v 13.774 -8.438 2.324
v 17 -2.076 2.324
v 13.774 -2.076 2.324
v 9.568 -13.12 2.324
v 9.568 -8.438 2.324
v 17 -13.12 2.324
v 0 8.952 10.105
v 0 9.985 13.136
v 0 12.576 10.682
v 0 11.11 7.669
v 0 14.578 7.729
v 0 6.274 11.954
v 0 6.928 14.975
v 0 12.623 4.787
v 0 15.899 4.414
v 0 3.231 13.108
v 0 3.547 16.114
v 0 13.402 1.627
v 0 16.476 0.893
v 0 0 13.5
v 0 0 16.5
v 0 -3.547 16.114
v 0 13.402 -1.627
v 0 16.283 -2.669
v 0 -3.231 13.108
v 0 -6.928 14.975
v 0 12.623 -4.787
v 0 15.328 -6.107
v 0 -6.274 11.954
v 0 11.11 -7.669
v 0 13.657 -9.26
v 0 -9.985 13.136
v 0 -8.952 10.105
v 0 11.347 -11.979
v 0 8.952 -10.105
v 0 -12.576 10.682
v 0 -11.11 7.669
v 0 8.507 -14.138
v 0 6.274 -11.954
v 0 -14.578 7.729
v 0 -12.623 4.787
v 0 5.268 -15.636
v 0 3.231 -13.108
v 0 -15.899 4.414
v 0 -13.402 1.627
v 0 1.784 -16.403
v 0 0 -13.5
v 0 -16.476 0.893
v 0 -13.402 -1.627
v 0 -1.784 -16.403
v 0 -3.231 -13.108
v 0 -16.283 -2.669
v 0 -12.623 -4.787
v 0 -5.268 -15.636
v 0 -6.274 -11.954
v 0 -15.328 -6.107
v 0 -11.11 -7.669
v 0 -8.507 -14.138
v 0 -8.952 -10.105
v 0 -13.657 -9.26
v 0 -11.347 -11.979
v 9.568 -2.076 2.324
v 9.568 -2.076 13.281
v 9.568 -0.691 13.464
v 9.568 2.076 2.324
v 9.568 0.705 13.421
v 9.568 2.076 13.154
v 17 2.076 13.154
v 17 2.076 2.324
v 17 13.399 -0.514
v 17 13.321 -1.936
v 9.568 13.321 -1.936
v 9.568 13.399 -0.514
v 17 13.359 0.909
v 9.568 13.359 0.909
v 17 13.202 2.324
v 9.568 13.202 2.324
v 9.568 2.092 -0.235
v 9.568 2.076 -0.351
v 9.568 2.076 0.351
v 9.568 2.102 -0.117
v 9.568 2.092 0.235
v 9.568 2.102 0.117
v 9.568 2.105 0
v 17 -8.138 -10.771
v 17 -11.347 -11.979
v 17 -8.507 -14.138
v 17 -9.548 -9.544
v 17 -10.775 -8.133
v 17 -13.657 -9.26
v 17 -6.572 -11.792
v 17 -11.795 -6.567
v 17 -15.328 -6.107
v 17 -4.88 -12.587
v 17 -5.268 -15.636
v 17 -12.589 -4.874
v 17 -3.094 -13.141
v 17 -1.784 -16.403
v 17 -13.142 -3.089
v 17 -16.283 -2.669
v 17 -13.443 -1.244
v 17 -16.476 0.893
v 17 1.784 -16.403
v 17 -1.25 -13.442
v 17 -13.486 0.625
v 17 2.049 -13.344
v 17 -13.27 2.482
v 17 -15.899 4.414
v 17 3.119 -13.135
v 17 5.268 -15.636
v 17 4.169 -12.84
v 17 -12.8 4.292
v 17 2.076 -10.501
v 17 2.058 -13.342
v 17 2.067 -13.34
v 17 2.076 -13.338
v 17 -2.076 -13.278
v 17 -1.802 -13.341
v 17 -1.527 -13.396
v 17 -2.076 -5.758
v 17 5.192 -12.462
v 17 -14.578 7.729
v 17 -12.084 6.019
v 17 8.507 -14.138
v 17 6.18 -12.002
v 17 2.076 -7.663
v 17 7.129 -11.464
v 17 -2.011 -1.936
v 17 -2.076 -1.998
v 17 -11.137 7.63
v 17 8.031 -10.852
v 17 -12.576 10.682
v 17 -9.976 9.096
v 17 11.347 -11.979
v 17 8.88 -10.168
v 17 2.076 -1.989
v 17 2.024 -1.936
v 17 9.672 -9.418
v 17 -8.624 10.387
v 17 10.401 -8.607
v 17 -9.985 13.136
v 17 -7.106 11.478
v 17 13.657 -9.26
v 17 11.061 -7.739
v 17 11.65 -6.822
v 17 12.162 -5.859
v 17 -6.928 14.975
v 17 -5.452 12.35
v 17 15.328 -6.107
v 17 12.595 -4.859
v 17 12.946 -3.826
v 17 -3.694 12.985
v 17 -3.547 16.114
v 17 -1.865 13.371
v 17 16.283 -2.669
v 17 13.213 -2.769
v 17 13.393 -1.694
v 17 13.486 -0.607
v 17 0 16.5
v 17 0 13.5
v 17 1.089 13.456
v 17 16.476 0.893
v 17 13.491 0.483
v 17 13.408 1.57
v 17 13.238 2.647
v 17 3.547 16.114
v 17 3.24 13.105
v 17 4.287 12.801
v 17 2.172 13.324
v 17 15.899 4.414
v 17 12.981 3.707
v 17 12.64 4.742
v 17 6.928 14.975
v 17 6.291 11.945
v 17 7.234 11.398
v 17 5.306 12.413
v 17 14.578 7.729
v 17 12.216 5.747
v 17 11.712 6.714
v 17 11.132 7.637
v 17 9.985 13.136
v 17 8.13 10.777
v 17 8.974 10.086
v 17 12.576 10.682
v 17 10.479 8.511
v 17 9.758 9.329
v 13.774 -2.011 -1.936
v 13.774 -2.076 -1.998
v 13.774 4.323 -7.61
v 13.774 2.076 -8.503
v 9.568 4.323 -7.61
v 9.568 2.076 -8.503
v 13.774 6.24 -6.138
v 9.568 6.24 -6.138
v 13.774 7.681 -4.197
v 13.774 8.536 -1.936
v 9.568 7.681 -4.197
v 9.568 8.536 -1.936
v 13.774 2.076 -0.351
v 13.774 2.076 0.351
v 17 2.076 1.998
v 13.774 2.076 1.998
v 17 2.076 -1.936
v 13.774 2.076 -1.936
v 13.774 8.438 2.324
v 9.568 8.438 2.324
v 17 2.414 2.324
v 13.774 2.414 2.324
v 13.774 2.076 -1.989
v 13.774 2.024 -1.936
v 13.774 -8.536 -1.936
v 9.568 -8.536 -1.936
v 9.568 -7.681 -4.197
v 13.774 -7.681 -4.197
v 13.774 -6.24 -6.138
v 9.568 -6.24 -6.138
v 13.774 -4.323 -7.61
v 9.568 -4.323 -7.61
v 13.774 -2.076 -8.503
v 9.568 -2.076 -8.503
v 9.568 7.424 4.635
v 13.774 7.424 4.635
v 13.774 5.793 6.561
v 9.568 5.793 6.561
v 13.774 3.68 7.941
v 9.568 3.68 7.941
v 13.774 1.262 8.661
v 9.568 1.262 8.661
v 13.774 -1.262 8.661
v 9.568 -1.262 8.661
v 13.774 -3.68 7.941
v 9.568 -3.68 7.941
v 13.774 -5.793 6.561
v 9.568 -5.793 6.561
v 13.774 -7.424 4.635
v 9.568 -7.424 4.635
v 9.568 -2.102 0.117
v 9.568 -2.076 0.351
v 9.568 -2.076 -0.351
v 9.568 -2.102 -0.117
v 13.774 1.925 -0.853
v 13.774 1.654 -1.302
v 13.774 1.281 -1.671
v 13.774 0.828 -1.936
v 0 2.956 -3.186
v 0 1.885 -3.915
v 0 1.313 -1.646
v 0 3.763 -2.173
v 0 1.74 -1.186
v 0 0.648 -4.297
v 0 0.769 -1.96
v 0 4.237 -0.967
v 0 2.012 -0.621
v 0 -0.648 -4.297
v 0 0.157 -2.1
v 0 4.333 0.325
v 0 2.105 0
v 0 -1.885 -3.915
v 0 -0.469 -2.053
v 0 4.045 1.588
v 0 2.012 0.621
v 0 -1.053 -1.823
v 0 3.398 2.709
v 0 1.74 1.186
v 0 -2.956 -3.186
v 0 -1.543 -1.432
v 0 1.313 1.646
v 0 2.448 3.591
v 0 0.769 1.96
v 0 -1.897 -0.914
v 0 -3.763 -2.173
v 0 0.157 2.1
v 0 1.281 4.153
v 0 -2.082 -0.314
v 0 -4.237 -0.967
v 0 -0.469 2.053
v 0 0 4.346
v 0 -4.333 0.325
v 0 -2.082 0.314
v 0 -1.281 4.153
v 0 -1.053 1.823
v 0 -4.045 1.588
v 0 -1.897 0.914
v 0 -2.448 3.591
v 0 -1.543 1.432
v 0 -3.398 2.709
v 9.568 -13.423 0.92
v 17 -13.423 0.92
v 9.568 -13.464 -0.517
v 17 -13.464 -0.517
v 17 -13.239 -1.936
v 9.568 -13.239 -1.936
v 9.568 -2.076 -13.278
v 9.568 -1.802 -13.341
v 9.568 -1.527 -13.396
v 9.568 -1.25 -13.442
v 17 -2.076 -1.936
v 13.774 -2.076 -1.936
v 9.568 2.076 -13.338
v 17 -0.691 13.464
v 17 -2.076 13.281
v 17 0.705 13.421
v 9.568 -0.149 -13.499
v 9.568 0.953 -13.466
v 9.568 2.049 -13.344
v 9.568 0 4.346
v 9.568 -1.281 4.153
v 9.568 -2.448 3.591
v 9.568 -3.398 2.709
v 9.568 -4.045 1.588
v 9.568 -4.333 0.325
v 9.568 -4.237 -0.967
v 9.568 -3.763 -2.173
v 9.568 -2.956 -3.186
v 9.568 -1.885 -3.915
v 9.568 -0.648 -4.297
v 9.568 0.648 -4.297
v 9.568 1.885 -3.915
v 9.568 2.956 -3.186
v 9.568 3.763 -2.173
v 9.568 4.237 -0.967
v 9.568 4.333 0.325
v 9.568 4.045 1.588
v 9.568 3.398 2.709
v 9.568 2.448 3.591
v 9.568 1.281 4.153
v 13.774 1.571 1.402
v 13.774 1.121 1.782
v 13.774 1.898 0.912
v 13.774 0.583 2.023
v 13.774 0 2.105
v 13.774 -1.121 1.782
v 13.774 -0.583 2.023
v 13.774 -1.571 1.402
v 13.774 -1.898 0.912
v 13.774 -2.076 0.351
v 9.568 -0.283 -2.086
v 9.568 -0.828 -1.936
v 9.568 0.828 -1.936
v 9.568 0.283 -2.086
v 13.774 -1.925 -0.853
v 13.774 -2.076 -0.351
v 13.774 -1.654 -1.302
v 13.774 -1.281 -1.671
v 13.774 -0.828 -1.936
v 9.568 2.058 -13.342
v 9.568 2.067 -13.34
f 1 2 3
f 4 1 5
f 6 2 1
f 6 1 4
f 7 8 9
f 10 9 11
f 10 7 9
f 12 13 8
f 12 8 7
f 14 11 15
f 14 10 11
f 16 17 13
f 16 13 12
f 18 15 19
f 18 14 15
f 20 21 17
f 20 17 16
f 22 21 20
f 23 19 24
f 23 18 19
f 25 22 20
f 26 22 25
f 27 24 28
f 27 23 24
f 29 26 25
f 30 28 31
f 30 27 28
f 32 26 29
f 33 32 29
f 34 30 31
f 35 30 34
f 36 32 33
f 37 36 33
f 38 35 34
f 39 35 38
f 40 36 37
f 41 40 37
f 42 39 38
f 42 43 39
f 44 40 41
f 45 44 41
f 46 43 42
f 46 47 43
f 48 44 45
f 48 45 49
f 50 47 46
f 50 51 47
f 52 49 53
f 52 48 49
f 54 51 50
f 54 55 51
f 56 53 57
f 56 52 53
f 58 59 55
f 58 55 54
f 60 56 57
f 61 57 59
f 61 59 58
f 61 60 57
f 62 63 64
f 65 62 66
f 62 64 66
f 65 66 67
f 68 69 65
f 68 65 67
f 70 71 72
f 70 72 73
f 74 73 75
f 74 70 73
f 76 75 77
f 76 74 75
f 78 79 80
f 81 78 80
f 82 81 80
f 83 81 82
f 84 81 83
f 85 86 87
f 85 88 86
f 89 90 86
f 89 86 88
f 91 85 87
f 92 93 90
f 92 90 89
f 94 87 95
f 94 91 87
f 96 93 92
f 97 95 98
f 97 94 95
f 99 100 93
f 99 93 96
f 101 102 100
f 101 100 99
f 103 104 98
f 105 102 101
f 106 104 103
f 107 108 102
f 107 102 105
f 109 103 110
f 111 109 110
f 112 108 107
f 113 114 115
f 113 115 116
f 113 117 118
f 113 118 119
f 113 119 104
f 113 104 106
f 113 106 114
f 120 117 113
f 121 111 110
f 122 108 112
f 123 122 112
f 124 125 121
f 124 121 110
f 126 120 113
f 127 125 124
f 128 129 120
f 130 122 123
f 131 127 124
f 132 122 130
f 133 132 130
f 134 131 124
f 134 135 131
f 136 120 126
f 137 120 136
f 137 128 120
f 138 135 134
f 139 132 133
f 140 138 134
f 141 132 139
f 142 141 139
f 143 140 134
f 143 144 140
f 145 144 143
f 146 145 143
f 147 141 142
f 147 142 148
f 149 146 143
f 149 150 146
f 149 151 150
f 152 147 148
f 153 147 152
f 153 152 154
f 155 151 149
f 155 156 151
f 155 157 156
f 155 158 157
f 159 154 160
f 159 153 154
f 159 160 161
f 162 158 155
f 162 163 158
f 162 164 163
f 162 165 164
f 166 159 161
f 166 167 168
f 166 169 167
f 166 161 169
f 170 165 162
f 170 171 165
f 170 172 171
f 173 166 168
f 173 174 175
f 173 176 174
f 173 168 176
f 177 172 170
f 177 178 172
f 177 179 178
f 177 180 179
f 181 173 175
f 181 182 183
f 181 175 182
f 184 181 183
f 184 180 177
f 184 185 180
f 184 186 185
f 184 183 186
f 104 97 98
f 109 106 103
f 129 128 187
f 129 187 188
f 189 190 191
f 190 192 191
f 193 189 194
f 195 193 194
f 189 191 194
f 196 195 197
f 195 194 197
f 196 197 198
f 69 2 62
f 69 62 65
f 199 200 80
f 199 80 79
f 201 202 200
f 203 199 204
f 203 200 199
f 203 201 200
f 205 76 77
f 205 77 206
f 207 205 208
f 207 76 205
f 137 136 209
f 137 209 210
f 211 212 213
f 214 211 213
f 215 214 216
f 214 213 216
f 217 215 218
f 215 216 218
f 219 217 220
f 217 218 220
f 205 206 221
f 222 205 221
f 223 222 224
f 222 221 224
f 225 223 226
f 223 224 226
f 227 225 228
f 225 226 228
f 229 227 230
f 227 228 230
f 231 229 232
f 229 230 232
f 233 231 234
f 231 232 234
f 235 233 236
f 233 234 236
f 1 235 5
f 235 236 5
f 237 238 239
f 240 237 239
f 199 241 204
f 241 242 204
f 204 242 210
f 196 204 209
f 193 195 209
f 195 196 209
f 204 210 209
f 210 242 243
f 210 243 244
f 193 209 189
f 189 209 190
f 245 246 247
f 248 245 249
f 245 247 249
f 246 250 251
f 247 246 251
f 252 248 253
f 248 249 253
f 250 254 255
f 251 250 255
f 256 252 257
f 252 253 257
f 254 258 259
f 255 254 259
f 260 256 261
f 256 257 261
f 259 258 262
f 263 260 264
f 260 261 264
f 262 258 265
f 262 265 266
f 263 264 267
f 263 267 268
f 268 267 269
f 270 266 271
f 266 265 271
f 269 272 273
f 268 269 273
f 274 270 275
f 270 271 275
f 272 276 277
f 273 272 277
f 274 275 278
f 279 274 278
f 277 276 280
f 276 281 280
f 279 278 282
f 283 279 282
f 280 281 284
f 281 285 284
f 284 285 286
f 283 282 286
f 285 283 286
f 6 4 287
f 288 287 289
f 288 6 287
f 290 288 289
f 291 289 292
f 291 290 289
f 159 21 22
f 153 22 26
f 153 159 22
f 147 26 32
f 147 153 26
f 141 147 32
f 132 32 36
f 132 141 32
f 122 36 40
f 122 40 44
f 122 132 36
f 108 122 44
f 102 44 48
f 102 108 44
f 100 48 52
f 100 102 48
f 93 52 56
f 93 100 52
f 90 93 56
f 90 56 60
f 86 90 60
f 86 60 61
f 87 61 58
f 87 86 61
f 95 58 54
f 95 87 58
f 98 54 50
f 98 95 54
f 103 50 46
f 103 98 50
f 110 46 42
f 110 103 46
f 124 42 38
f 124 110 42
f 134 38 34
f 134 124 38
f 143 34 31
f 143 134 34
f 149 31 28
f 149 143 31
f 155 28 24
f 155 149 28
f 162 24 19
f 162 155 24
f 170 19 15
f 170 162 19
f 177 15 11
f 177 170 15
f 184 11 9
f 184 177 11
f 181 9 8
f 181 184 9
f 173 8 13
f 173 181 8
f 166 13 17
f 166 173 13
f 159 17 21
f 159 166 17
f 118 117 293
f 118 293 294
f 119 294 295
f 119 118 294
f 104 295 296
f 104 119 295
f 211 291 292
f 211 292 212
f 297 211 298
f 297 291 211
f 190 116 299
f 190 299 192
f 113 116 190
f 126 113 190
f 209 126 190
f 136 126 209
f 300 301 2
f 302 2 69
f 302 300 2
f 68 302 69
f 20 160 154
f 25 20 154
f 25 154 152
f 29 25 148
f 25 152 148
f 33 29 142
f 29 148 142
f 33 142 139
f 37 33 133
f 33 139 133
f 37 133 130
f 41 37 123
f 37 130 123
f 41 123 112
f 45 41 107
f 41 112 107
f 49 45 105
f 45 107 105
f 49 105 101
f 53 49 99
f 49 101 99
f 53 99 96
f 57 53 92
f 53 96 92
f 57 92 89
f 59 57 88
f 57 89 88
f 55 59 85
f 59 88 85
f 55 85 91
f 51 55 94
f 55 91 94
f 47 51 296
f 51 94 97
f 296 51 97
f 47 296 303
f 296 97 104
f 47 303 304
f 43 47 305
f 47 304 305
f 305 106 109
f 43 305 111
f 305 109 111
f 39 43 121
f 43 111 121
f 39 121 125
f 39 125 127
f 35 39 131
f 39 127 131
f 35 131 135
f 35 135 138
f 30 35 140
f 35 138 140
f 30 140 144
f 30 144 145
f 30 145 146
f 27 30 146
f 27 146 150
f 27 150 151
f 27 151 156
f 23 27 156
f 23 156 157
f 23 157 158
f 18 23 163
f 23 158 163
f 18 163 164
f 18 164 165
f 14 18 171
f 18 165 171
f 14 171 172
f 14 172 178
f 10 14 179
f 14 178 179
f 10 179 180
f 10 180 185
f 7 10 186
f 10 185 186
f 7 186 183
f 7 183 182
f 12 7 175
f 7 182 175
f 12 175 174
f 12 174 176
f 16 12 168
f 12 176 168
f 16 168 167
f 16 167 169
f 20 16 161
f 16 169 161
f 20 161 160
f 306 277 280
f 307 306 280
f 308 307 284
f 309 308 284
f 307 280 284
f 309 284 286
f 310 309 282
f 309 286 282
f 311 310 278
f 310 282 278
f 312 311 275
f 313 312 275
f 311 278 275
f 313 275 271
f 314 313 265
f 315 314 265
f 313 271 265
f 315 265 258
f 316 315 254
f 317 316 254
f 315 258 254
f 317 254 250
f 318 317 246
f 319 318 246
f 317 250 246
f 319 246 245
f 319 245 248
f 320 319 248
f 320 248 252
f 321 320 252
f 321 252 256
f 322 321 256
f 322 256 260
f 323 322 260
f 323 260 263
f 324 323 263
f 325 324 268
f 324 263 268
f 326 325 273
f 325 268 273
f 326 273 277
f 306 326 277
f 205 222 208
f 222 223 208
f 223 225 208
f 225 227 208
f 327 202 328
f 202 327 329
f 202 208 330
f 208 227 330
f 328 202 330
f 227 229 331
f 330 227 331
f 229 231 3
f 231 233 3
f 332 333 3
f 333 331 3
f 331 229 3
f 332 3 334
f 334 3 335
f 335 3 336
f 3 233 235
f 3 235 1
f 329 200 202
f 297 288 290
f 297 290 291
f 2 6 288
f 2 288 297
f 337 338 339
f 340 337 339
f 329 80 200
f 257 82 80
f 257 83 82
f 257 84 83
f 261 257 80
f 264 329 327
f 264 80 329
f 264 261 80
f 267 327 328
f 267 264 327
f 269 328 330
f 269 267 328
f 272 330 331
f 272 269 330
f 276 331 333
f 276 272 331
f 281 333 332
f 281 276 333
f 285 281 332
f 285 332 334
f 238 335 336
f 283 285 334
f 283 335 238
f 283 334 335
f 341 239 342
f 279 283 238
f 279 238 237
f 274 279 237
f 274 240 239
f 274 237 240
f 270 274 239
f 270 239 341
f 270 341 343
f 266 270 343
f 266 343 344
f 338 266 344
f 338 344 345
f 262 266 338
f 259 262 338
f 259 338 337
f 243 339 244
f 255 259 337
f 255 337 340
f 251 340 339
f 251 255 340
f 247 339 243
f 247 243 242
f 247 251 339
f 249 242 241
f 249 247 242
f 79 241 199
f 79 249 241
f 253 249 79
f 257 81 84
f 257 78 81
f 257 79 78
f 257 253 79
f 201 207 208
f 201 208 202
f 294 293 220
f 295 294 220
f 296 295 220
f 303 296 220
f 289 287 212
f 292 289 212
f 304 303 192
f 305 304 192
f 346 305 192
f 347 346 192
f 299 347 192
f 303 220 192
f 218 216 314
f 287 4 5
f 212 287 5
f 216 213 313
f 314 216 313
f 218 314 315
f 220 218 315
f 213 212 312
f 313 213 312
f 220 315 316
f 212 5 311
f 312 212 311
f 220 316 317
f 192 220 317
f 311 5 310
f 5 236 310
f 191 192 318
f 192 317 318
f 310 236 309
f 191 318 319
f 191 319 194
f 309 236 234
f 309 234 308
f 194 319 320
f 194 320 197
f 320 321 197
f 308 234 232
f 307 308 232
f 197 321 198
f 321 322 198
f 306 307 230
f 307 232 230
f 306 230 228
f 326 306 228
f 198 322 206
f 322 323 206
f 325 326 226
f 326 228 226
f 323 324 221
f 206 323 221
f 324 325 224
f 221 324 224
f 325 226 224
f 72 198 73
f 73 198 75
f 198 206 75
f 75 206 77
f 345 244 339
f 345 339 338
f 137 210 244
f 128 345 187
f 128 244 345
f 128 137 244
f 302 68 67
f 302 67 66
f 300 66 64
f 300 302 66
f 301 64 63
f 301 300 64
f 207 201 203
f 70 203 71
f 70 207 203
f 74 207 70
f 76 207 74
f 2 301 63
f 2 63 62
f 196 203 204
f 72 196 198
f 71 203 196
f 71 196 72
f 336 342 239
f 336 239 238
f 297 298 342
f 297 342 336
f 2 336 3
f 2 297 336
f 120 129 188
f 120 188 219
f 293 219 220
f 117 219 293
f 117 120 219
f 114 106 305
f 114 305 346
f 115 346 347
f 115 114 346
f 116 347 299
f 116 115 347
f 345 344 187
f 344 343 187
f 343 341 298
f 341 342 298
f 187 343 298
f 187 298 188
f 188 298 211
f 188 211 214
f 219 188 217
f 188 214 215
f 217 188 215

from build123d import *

# Parameters (mm, degrees)
F0_W     = 17
F0_H     = 3
F2_R     = 2.10545285
F3_DEPTH = 17.001
F5_DEPTH = 7.4320044443


# Not quite as in the source:
# - a feature of the source that left no trace in its solid (it failed there, or was rolled back) is left out


with BuildPart() as f1:
    # F0 (on Front) → F1 (revolve)
    with BuildSketch(Plane.XZ):
        Polygon((0, 4.3456270359), (0, 0), (13.7743903324, 0), (13.7743903324, 8.752326481), (9.5679955557, 8.752326481), (9.5679955557, 4.3456270359), align=None)
    revolve(axis=Axis((-17.2238798179, 0, 0), (1, 0, 0)))

    # F2 (on Right) → F3 (cut, through all)
    with BuildSketch(Plane.YZ):
        Circle(F2_R)
    extrude(amount=F3_DEPTH, mode=Mode.SUBTRACT)



with BuildPart() as f1b:
    # F0 (on Front) → F1, piece 2 (revolve)
    with BuildSketch(Plane.XZ):
        with Locations((8.5, 15)):
            Rectangle(F0_W, F0_H)
    revolve(axis=Axis((-17.2238798179, 0, 0), (1, 0, 0)))


with BuildPart() as f5:
    # F4 (on face) → F5 (new body, through all)
    with BuildSketch(Plane.YZ.offset(17)):
        with BuildLine():
            Line((2.075988996, 2.3240637966), (2.075988996, 3.8176883089))
            Line((2.075988996, 3.8176883089), (2.075988996, 13.1538297552))
            ThreePointArc((2.075988996, 13.1538297552), (0.0077885172, 13.4710626416), (-2.075988996, 13.2814282551))
            Line((-2.075988996, 13.2814282551), (-2.075988996, 3.8176883089))
            Line((-2.075988996, 3.8176883089), (-2.075988996, 2.3240637966))
            Line((-2.075988996, 2.3240637966), (2.075988996, 2.3240637966))
        make_face()
    extrude(amount=-F5_DEPTH)


with BuildPart() as f1_1:
    add(f1.part)

    add(f1b.part)  # F5#2 merges F1b
    # F4 (on face) → F5, piece 2 (join, through all)
    with BuildSketch(Plane.YZ.offset(17)):
        with BuildLine():
            Line((-2.075988996, -1.9356221886), (-2.075988996, 2.3240637966))
            Line((-2.075988996, 2.3240637966), (-13.1198950112, 2.3240637966))
            ThreePointArc((-13.1198950112, 2.3240637966), (-13.4767107858, 0.2025324211), (-13.2389972203, -1.9356221886))
            Line((-13.2389972203, -1.9356221886), (-3.8907378578, -1.9356221886))
            Line((-3.8907378578, -1.9356221886), (-2.075988996, -1.9356221886))
        make_face()
        with BuildLine():
            Line((2.41431853, 2.3240637966), (2.075988996, 1.9983820725))
            Line((2.075988996, 1.9983820725), (2.075988996, -1.9356221886))
            Line((2.075988996, -1.9356221886), (13.3207021949, -1.9356221886))
            ThreePointArc((13.3207021949, -1.9356221886), (13.3933684368, 0.1979176461), (13.2015999407, 2.3240637966))
            Line((13.2015999407, 2.3240637966), (2.41431853, 2.3240637966))
        make_face()
        with BuildLine():
            Line((2.075988996, -13.3378216997), (2.075988996, -1.9891557531))
            Line((2.075988996, -1.9891557531), (2.0244566825, -1.9356221886))
            Line((2.0244566825, -1.9356221886), (-2.0107918397, -1.9356221886))
            Line((-2.0107918397, -1.9356221886), (-2.075988996, -1.9983820725))
            Line((-2.075988996, -1.9983820725), (-2.075988996, -13.2782710716))
            ThreePointArc((-2.075988996, -13.2782710716), (-1.6646206015, -13.3695995078), (-1.2495113457, -13.4420504908))
            ThreePointArc((-1.2495113457, -13.4420504908), (0.4028347053, -13.4939884467), (2.049140015, -13.3435761773))
            ThreePointArc((2.049140015, -13.3435761773), (2.0625666461, -13.3407089263), (2.075988996, -13.3378216997))
        make_face()
    extrude(amount=-F5_DEPTH)


solid = Compound([f5.part, f1_1.part])
